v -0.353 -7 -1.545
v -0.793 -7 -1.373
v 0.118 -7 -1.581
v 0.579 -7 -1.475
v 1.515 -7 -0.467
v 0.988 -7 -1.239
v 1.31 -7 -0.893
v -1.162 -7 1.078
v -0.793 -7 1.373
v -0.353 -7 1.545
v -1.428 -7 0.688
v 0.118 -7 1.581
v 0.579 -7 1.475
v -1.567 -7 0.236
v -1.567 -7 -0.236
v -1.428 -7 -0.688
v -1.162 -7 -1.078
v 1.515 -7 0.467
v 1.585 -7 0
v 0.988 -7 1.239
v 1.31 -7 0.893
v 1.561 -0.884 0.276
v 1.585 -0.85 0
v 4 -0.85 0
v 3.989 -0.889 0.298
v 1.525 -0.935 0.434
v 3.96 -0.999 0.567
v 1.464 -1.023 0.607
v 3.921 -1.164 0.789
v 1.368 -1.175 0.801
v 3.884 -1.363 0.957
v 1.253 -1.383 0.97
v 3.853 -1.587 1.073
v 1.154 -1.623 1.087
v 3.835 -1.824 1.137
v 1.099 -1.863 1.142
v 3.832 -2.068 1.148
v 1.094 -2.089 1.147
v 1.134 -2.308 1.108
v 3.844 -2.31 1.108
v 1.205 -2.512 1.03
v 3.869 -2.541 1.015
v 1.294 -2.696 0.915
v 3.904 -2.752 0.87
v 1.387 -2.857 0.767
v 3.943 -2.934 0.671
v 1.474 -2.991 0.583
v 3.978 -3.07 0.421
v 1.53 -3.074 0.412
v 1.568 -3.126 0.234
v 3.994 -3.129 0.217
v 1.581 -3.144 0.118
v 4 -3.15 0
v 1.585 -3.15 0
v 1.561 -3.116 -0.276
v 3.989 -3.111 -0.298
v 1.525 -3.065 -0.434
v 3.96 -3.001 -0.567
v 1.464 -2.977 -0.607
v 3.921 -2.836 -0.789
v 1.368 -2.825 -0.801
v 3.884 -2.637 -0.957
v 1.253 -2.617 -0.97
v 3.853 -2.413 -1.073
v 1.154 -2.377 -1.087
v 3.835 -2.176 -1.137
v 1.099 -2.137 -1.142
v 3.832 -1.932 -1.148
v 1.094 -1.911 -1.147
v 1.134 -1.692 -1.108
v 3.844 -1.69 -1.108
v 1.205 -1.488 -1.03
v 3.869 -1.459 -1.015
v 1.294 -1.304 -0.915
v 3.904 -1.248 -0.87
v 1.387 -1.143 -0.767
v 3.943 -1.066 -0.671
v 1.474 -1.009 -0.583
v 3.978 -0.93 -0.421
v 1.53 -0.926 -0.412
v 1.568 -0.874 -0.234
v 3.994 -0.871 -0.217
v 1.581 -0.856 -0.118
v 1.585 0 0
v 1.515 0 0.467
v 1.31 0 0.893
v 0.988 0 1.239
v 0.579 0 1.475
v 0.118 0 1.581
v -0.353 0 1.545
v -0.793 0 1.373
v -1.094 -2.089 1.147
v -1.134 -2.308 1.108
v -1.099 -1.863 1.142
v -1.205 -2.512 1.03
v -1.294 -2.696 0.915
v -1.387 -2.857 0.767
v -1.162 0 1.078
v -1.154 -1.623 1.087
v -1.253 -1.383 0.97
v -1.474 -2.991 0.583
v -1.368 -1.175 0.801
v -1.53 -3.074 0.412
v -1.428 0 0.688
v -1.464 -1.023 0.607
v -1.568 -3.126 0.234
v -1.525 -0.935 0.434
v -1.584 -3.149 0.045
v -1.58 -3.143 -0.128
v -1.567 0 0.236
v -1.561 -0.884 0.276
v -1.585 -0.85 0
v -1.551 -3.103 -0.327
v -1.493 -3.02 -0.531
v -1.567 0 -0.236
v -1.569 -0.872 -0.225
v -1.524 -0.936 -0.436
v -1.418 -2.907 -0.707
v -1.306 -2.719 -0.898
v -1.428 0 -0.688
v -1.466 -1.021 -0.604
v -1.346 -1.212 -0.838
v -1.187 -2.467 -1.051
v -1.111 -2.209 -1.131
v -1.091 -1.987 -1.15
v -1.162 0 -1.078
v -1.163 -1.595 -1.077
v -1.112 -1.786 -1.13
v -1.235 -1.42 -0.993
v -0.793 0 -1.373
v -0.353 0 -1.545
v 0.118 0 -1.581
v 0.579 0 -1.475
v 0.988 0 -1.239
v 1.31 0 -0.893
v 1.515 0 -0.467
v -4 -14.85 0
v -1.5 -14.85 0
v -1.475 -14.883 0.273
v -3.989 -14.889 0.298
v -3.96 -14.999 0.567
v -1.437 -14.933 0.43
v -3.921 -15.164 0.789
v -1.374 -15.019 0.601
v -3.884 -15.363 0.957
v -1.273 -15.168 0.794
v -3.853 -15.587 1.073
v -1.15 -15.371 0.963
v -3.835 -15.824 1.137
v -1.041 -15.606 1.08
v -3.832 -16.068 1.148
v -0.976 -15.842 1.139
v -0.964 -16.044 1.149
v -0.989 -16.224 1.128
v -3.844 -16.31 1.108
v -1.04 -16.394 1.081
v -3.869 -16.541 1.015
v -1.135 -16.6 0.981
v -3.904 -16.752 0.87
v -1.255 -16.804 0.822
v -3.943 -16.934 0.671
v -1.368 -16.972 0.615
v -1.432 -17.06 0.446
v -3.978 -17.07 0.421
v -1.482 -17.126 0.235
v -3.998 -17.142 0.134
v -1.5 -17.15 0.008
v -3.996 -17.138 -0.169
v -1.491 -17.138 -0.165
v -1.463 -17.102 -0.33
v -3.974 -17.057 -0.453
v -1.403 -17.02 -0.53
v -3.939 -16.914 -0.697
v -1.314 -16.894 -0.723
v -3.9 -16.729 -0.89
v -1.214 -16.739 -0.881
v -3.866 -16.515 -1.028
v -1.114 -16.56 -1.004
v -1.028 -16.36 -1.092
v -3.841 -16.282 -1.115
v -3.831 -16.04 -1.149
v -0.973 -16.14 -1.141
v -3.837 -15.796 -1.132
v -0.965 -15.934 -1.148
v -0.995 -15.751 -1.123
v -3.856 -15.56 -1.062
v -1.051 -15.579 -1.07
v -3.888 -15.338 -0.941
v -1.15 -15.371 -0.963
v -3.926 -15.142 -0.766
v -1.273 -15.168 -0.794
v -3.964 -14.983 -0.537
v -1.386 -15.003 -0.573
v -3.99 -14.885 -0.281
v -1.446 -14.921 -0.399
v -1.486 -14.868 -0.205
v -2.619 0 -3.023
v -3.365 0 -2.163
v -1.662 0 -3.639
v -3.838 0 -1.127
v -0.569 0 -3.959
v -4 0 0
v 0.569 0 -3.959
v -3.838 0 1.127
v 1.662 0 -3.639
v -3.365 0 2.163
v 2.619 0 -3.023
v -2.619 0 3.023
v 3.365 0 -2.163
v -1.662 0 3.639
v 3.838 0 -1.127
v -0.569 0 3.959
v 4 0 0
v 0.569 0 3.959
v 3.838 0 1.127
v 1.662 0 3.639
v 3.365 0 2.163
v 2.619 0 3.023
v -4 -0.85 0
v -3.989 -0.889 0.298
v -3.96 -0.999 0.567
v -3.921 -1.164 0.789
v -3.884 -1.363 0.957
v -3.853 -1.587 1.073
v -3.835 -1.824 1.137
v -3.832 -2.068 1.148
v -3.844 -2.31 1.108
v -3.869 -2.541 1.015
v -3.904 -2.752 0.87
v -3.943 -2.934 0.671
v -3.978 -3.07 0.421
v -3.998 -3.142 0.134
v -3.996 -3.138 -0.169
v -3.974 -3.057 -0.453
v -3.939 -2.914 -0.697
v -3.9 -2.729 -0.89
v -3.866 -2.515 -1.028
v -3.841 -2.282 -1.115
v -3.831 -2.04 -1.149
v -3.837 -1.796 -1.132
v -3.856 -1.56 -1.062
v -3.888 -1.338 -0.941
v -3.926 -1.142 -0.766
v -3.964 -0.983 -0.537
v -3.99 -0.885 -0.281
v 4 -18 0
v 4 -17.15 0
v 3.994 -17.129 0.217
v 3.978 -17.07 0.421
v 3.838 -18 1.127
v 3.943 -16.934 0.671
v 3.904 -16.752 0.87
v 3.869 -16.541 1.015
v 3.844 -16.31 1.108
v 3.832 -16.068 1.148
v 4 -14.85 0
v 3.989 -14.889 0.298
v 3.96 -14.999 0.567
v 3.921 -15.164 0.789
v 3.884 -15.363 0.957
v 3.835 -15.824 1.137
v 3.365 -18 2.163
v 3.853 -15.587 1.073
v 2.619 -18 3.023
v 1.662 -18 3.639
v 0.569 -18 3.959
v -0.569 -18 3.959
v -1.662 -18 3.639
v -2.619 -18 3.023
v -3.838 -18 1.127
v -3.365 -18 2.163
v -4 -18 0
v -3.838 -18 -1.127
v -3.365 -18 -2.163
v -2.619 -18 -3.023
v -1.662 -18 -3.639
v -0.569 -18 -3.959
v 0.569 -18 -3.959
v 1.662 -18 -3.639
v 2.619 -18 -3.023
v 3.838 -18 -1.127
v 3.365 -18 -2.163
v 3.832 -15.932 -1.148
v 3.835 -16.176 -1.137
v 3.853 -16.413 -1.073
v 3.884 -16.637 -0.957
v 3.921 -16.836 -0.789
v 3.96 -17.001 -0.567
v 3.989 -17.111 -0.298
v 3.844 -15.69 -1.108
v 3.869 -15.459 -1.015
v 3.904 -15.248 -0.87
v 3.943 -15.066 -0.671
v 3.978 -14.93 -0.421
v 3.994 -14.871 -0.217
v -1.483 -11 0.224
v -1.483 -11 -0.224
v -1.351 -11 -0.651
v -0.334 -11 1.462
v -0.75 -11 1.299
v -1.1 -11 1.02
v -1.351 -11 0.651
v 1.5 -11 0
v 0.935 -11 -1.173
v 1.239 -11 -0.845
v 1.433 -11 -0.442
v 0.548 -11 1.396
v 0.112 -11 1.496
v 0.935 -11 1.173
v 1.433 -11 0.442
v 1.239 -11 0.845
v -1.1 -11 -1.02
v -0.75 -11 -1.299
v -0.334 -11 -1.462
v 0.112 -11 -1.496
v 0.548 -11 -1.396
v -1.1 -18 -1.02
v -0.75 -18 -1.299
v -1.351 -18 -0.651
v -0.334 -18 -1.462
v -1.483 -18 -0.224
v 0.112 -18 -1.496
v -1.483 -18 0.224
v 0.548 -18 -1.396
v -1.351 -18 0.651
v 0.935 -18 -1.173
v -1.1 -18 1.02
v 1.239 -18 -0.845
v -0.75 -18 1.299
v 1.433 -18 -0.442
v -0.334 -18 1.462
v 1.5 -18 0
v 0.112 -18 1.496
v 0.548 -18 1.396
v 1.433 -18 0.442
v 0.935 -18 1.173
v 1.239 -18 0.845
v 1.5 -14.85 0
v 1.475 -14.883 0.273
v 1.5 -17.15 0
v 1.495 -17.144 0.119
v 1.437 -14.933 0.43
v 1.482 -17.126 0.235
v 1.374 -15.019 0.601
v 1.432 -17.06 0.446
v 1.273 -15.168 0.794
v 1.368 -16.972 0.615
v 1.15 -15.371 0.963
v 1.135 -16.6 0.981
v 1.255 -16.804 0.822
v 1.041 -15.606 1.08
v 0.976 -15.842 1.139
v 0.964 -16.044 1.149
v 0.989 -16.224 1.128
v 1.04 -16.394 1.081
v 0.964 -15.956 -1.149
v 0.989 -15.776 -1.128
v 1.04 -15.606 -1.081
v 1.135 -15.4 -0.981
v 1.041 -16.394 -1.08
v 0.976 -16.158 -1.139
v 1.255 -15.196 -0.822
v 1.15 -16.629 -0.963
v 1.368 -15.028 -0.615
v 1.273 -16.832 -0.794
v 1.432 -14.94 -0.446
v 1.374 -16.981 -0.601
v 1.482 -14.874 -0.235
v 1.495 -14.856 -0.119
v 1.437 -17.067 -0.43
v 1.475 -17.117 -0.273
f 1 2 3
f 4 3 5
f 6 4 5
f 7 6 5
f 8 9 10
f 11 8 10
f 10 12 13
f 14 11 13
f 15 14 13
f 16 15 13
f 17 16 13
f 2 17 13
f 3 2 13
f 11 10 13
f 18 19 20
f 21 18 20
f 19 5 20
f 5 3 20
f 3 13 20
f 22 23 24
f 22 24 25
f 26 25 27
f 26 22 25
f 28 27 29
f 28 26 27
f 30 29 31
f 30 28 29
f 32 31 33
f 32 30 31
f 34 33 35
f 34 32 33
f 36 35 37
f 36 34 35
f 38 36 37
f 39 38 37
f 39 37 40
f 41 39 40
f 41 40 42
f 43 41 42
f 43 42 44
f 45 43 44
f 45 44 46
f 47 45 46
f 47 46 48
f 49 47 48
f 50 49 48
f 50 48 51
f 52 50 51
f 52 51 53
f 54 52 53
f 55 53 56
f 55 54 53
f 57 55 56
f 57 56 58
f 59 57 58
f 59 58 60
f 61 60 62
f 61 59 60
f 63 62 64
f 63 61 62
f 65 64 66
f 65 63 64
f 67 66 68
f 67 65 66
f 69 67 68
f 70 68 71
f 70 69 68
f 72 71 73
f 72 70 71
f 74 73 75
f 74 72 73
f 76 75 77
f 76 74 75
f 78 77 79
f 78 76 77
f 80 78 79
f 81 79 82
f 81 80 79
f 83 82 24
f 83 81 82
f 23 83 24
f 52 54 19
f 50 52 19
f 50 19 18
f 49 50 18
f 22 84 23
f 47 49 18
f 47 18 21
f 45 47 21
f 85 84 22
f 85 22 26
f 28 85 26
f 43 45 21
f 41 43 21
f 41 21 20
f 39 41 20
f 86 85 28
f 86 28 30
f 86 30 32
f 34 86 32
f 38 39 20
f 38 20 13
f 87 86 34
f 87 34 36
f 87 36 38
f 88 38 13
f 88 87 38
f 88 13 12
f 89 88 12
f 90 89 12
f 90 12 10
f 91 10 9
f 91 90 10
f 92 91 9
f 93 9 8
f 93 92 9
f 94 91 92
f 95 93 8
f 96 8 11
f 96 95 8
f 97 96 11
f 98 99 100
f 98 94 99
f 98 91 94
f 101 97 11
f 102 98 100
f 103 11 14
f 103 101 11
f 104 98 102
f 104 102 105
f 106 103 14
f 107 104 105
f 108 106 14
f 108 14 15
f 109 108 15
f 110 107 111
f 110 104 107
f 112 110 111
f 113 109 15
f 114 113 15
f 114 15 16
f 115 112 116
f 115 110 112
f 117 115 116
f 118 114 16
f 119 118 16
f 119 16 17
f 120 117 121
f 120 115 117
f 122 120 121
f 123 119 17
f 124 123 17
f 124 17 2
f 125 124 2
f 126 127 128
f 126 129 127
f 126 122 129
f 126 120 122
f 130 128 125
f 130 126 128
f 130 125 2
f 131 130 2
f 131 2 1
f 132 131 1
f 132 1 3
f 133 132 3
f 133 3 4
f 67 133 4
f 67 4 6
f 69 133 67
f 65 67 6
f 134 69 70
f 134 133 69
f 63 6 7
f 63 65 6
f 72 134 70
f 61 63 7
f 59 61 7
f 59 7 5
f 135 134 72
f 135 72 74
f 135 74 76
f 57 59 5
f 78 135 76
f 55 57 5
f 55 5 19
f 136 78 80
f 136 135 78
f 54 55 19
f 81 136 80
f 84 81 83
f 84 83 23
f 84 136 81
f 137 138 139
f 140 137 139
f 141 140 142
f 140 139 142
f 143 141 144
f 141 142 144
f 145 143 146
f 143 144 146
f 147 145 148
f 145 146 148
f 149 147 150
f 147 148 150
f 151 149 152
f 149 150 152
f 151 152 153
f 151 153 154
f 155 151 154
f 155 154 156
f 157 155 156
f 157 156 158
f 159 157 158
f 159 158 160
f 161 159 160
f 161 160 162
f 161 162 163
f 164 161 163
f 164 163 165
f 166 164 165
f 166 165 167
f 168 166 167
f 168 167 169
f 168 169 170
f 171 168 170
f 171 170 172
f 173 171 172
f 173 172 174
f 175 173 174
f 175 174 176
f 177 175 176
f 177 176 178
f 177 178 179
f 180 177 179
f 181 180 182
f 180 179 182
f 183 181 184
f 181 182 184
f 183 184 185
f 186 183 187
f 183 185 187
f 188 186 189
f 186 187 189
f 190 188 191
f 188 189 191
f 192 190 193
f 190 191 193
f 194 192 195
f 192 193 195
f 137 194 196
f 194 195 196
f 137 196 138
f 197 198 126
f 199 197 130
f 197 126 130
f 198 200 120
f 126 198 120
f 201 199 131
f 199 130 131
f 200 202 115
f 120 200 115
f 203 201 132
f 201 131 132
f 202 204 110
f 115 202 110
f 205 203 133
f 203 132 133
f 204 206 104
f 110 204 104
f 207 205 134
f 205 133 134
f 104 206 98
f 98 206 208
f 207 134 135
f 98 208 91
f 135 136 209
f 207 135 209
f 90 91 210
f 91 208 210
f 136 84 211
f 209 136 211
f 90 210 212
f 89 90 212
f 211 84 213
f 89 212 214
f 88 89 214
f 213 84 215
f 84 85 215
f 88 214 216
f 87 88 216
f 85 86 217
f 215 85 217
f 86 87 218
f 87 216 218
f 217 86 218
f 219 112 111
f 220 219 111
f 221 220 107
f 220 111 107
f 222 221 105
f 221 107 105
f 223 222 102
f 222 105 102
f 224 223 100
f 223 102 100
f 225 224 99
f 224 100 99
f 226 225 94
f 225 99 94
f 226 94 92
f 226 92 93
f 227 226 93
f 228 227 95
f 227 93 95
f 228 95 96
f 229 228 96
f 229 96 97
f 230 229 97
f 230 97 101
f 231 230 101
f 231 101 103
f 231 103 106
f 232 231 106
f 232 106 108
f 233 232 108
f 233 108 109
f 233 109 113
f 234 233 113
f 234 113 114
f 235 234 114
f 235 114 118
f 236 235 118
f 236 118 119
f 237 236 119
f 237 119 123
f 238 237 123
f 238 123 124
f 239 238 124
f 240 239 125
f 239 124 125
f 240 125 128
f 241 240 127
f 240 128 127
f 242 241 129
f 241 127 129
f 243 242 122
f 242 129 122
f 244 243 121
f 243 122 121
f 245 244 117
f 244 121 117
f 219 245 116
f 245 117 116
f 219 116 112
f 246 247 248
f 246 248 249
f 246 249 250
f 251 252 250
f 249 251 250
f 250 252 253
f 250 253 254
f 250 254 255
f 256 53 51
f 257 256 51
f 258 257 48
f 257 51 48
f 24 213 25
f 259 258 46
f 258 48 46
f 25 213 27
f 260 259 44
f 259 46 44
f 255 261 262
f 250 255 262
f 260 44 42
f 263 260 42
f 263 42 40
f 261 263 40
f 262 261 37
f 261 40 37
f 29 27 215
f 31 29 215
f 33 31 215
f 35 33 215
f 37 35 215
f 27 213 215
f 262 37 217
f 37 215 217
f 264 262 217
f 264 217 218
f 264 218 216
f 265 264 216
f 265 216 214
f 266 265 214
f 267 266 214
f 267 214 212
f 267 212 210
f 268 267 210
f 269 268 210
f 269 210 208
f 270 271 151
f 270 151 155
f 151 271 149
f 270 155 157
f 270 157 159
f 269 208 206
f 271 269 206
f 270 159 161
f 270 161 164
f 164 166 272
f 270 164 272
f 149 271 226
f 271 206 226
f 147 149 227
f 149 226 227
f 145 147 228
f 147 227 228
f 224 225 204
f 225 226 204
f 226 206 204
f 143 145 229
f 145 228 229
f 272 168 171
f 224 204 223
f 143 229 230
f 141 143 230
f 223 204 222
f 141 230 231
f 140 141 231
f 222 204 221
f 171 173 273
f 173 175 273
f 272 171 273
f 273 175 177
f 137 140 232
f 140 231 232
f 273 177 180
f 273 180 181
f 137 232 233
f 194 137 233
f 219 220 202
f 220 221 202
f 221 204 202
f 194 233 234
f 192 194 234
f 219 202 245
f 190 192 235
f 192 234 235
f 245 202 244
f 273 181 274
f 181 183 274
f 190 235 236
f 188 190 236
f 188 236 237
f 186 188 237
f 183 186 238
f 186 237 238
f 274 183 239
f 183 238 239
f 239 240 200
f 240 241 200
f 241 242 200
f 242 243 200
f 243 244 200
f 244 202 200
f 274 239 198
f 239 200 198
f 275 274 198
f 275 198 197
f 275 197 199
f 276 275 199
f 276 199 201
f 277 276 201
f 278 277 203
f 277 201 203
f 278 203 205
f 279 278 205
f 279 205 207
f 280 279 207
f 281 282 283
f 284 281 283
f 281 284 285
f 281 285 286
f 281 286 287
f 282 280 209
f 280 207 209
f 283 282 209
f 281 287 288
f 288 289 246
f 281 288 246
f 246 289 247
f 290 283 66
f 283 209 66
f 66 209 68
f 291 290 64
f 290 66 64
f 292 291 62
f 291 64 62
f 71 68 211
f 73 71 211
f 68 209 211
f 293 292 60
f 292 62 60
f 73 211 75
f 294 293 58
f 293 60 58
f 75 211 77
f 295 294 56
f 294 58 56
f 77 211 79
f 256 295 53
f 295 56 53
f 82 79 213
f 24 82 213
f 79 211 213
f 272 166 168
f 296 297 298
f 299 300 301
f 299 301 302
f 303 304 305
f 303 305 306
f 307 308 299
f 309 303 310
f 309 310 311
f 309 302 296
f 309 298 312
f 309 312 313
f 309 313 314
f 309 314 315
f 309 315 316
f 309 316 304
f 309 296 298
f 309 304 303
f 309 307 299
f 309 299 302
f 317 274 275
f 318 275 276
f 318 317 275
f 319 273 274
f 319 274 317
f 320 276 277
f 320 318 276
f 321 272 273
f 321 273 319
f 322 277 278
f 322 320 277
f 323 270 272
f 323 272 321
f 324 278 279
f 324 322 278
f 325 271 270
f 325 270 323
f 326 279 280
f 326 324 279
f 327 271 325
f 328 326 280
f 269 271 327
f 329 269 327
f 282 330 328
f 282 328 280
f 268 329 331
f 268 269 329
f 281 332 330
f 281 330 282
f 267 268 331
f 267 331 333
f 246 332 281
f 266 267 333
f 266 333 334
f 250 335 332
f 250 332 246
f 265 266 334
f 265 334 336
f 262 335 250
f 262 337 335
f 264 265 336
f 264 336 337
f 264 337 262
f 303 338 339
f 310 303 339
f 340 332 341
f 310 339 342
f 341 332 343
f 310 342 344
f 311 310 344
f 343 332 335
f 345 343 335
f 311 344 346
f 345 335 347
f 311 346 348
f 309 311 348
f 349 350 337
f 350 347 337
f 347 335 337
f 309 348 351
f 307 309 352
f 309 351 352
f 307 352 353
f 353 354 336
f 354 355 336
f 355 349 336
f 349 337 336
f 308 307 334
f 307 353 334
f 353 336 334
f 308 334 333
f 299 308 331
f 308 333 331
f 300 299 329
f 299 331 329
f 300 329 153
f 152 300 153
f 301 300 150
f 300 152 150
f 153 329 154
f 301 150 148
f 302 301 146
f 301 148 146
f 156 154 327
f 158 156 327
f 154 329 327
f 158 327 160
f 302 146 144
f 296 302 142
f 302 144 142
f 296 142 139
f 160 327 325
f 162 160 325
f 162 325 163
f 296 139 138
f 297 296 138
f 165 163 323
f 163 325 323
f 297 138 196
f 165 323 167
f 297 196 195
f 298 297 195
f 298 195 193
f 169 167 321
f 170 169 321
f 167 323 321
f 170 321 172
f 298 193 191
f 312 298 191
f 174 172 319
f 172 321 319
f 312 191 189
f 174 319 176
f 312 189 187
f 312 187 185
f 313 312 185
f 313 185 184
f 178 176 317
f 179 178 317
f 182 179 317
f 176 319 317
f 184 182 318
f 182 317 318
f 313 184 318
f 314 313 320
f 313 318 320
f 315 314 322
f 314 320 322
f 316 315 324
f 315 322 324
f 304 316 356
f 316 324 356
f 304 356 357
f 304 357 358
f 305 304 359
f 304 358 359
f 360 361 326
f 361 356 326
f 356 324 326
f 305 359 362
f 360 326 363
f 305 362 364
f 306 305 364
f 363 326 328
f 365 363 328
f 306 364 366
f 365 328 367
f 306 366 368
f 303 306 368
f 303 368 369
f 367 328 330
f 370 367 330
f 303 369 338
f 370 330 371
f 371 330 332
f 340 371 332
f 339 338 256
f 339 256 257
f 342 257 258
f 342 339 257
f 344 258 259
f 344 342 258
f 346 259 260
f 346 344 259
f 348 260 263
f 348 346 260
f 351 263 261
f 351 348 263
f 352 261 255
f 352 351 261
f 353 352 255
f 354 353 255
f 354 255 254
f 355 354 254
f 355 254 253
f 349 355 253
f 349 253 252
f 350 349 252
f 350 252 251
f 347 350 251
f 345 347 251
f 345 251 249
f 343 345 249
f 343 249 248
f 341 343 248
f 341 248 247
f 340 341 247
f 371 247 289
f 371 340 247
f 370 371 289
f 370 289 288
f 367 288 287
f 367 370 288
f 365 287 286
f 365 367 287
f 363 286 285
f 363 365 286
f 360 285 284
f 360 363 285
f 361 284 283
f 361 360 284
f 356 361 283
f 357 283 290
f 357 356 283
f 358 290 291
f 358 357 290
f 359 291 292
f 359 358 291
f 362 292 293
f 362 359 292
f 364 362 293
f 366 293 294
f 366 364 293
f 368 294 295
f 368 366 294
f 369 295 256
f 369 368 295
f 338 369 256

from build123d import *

# Parameters (mm, degrees)
F0_R          = 4
F1_DEPTH      = 18
F2_R          = 1.15
F3_DEPTH      = 4.001
F3_DEPTH_BACK = 4.001
F4_R          = 1.585
F5_DEPTH      = 7
F7_R          = 1.5
F8_DEPTH      = 7


with BuildPart() as f1:
    # F0 (on Front) → F1 (new body)
    with BuildSketch(Plane.XZ):
        Circle(F0_R)
    extrude(amount=F1_DEPTH)

    # F2 (on Right) → F3 (cut, two sides)
    with BuildSketch(Plane.YZ) as f3_sk:
        with Locations((-16, 0)):
            Circle(F2_R)
        with Locations((-2, 0)):
            Circle(F2_R)
    extrude(amount=-F3_DEPTH, mode=Mode.SUBTRACT)
    extrude(f3_sk.sketch, amount=F3_DEPTH_BACK, mode=Mode.SUBTRACT)

    # F4 (on Front) → F5 (cut)
    with BuildSketch(Plane.XZ):
        Circle(F4_R)
    extrude(amount=F5_DEPTH, mode=Mode.SUBTRACT)

    # F7 (on offset) → F8 (cut)
    with BuildSketch(Plane.XZ.offset(18)):
        Circle(F7_R)
    extrude(amount=-F8_DEPTH, mode=Mode.SUBTRACT)


solid = f1.part
